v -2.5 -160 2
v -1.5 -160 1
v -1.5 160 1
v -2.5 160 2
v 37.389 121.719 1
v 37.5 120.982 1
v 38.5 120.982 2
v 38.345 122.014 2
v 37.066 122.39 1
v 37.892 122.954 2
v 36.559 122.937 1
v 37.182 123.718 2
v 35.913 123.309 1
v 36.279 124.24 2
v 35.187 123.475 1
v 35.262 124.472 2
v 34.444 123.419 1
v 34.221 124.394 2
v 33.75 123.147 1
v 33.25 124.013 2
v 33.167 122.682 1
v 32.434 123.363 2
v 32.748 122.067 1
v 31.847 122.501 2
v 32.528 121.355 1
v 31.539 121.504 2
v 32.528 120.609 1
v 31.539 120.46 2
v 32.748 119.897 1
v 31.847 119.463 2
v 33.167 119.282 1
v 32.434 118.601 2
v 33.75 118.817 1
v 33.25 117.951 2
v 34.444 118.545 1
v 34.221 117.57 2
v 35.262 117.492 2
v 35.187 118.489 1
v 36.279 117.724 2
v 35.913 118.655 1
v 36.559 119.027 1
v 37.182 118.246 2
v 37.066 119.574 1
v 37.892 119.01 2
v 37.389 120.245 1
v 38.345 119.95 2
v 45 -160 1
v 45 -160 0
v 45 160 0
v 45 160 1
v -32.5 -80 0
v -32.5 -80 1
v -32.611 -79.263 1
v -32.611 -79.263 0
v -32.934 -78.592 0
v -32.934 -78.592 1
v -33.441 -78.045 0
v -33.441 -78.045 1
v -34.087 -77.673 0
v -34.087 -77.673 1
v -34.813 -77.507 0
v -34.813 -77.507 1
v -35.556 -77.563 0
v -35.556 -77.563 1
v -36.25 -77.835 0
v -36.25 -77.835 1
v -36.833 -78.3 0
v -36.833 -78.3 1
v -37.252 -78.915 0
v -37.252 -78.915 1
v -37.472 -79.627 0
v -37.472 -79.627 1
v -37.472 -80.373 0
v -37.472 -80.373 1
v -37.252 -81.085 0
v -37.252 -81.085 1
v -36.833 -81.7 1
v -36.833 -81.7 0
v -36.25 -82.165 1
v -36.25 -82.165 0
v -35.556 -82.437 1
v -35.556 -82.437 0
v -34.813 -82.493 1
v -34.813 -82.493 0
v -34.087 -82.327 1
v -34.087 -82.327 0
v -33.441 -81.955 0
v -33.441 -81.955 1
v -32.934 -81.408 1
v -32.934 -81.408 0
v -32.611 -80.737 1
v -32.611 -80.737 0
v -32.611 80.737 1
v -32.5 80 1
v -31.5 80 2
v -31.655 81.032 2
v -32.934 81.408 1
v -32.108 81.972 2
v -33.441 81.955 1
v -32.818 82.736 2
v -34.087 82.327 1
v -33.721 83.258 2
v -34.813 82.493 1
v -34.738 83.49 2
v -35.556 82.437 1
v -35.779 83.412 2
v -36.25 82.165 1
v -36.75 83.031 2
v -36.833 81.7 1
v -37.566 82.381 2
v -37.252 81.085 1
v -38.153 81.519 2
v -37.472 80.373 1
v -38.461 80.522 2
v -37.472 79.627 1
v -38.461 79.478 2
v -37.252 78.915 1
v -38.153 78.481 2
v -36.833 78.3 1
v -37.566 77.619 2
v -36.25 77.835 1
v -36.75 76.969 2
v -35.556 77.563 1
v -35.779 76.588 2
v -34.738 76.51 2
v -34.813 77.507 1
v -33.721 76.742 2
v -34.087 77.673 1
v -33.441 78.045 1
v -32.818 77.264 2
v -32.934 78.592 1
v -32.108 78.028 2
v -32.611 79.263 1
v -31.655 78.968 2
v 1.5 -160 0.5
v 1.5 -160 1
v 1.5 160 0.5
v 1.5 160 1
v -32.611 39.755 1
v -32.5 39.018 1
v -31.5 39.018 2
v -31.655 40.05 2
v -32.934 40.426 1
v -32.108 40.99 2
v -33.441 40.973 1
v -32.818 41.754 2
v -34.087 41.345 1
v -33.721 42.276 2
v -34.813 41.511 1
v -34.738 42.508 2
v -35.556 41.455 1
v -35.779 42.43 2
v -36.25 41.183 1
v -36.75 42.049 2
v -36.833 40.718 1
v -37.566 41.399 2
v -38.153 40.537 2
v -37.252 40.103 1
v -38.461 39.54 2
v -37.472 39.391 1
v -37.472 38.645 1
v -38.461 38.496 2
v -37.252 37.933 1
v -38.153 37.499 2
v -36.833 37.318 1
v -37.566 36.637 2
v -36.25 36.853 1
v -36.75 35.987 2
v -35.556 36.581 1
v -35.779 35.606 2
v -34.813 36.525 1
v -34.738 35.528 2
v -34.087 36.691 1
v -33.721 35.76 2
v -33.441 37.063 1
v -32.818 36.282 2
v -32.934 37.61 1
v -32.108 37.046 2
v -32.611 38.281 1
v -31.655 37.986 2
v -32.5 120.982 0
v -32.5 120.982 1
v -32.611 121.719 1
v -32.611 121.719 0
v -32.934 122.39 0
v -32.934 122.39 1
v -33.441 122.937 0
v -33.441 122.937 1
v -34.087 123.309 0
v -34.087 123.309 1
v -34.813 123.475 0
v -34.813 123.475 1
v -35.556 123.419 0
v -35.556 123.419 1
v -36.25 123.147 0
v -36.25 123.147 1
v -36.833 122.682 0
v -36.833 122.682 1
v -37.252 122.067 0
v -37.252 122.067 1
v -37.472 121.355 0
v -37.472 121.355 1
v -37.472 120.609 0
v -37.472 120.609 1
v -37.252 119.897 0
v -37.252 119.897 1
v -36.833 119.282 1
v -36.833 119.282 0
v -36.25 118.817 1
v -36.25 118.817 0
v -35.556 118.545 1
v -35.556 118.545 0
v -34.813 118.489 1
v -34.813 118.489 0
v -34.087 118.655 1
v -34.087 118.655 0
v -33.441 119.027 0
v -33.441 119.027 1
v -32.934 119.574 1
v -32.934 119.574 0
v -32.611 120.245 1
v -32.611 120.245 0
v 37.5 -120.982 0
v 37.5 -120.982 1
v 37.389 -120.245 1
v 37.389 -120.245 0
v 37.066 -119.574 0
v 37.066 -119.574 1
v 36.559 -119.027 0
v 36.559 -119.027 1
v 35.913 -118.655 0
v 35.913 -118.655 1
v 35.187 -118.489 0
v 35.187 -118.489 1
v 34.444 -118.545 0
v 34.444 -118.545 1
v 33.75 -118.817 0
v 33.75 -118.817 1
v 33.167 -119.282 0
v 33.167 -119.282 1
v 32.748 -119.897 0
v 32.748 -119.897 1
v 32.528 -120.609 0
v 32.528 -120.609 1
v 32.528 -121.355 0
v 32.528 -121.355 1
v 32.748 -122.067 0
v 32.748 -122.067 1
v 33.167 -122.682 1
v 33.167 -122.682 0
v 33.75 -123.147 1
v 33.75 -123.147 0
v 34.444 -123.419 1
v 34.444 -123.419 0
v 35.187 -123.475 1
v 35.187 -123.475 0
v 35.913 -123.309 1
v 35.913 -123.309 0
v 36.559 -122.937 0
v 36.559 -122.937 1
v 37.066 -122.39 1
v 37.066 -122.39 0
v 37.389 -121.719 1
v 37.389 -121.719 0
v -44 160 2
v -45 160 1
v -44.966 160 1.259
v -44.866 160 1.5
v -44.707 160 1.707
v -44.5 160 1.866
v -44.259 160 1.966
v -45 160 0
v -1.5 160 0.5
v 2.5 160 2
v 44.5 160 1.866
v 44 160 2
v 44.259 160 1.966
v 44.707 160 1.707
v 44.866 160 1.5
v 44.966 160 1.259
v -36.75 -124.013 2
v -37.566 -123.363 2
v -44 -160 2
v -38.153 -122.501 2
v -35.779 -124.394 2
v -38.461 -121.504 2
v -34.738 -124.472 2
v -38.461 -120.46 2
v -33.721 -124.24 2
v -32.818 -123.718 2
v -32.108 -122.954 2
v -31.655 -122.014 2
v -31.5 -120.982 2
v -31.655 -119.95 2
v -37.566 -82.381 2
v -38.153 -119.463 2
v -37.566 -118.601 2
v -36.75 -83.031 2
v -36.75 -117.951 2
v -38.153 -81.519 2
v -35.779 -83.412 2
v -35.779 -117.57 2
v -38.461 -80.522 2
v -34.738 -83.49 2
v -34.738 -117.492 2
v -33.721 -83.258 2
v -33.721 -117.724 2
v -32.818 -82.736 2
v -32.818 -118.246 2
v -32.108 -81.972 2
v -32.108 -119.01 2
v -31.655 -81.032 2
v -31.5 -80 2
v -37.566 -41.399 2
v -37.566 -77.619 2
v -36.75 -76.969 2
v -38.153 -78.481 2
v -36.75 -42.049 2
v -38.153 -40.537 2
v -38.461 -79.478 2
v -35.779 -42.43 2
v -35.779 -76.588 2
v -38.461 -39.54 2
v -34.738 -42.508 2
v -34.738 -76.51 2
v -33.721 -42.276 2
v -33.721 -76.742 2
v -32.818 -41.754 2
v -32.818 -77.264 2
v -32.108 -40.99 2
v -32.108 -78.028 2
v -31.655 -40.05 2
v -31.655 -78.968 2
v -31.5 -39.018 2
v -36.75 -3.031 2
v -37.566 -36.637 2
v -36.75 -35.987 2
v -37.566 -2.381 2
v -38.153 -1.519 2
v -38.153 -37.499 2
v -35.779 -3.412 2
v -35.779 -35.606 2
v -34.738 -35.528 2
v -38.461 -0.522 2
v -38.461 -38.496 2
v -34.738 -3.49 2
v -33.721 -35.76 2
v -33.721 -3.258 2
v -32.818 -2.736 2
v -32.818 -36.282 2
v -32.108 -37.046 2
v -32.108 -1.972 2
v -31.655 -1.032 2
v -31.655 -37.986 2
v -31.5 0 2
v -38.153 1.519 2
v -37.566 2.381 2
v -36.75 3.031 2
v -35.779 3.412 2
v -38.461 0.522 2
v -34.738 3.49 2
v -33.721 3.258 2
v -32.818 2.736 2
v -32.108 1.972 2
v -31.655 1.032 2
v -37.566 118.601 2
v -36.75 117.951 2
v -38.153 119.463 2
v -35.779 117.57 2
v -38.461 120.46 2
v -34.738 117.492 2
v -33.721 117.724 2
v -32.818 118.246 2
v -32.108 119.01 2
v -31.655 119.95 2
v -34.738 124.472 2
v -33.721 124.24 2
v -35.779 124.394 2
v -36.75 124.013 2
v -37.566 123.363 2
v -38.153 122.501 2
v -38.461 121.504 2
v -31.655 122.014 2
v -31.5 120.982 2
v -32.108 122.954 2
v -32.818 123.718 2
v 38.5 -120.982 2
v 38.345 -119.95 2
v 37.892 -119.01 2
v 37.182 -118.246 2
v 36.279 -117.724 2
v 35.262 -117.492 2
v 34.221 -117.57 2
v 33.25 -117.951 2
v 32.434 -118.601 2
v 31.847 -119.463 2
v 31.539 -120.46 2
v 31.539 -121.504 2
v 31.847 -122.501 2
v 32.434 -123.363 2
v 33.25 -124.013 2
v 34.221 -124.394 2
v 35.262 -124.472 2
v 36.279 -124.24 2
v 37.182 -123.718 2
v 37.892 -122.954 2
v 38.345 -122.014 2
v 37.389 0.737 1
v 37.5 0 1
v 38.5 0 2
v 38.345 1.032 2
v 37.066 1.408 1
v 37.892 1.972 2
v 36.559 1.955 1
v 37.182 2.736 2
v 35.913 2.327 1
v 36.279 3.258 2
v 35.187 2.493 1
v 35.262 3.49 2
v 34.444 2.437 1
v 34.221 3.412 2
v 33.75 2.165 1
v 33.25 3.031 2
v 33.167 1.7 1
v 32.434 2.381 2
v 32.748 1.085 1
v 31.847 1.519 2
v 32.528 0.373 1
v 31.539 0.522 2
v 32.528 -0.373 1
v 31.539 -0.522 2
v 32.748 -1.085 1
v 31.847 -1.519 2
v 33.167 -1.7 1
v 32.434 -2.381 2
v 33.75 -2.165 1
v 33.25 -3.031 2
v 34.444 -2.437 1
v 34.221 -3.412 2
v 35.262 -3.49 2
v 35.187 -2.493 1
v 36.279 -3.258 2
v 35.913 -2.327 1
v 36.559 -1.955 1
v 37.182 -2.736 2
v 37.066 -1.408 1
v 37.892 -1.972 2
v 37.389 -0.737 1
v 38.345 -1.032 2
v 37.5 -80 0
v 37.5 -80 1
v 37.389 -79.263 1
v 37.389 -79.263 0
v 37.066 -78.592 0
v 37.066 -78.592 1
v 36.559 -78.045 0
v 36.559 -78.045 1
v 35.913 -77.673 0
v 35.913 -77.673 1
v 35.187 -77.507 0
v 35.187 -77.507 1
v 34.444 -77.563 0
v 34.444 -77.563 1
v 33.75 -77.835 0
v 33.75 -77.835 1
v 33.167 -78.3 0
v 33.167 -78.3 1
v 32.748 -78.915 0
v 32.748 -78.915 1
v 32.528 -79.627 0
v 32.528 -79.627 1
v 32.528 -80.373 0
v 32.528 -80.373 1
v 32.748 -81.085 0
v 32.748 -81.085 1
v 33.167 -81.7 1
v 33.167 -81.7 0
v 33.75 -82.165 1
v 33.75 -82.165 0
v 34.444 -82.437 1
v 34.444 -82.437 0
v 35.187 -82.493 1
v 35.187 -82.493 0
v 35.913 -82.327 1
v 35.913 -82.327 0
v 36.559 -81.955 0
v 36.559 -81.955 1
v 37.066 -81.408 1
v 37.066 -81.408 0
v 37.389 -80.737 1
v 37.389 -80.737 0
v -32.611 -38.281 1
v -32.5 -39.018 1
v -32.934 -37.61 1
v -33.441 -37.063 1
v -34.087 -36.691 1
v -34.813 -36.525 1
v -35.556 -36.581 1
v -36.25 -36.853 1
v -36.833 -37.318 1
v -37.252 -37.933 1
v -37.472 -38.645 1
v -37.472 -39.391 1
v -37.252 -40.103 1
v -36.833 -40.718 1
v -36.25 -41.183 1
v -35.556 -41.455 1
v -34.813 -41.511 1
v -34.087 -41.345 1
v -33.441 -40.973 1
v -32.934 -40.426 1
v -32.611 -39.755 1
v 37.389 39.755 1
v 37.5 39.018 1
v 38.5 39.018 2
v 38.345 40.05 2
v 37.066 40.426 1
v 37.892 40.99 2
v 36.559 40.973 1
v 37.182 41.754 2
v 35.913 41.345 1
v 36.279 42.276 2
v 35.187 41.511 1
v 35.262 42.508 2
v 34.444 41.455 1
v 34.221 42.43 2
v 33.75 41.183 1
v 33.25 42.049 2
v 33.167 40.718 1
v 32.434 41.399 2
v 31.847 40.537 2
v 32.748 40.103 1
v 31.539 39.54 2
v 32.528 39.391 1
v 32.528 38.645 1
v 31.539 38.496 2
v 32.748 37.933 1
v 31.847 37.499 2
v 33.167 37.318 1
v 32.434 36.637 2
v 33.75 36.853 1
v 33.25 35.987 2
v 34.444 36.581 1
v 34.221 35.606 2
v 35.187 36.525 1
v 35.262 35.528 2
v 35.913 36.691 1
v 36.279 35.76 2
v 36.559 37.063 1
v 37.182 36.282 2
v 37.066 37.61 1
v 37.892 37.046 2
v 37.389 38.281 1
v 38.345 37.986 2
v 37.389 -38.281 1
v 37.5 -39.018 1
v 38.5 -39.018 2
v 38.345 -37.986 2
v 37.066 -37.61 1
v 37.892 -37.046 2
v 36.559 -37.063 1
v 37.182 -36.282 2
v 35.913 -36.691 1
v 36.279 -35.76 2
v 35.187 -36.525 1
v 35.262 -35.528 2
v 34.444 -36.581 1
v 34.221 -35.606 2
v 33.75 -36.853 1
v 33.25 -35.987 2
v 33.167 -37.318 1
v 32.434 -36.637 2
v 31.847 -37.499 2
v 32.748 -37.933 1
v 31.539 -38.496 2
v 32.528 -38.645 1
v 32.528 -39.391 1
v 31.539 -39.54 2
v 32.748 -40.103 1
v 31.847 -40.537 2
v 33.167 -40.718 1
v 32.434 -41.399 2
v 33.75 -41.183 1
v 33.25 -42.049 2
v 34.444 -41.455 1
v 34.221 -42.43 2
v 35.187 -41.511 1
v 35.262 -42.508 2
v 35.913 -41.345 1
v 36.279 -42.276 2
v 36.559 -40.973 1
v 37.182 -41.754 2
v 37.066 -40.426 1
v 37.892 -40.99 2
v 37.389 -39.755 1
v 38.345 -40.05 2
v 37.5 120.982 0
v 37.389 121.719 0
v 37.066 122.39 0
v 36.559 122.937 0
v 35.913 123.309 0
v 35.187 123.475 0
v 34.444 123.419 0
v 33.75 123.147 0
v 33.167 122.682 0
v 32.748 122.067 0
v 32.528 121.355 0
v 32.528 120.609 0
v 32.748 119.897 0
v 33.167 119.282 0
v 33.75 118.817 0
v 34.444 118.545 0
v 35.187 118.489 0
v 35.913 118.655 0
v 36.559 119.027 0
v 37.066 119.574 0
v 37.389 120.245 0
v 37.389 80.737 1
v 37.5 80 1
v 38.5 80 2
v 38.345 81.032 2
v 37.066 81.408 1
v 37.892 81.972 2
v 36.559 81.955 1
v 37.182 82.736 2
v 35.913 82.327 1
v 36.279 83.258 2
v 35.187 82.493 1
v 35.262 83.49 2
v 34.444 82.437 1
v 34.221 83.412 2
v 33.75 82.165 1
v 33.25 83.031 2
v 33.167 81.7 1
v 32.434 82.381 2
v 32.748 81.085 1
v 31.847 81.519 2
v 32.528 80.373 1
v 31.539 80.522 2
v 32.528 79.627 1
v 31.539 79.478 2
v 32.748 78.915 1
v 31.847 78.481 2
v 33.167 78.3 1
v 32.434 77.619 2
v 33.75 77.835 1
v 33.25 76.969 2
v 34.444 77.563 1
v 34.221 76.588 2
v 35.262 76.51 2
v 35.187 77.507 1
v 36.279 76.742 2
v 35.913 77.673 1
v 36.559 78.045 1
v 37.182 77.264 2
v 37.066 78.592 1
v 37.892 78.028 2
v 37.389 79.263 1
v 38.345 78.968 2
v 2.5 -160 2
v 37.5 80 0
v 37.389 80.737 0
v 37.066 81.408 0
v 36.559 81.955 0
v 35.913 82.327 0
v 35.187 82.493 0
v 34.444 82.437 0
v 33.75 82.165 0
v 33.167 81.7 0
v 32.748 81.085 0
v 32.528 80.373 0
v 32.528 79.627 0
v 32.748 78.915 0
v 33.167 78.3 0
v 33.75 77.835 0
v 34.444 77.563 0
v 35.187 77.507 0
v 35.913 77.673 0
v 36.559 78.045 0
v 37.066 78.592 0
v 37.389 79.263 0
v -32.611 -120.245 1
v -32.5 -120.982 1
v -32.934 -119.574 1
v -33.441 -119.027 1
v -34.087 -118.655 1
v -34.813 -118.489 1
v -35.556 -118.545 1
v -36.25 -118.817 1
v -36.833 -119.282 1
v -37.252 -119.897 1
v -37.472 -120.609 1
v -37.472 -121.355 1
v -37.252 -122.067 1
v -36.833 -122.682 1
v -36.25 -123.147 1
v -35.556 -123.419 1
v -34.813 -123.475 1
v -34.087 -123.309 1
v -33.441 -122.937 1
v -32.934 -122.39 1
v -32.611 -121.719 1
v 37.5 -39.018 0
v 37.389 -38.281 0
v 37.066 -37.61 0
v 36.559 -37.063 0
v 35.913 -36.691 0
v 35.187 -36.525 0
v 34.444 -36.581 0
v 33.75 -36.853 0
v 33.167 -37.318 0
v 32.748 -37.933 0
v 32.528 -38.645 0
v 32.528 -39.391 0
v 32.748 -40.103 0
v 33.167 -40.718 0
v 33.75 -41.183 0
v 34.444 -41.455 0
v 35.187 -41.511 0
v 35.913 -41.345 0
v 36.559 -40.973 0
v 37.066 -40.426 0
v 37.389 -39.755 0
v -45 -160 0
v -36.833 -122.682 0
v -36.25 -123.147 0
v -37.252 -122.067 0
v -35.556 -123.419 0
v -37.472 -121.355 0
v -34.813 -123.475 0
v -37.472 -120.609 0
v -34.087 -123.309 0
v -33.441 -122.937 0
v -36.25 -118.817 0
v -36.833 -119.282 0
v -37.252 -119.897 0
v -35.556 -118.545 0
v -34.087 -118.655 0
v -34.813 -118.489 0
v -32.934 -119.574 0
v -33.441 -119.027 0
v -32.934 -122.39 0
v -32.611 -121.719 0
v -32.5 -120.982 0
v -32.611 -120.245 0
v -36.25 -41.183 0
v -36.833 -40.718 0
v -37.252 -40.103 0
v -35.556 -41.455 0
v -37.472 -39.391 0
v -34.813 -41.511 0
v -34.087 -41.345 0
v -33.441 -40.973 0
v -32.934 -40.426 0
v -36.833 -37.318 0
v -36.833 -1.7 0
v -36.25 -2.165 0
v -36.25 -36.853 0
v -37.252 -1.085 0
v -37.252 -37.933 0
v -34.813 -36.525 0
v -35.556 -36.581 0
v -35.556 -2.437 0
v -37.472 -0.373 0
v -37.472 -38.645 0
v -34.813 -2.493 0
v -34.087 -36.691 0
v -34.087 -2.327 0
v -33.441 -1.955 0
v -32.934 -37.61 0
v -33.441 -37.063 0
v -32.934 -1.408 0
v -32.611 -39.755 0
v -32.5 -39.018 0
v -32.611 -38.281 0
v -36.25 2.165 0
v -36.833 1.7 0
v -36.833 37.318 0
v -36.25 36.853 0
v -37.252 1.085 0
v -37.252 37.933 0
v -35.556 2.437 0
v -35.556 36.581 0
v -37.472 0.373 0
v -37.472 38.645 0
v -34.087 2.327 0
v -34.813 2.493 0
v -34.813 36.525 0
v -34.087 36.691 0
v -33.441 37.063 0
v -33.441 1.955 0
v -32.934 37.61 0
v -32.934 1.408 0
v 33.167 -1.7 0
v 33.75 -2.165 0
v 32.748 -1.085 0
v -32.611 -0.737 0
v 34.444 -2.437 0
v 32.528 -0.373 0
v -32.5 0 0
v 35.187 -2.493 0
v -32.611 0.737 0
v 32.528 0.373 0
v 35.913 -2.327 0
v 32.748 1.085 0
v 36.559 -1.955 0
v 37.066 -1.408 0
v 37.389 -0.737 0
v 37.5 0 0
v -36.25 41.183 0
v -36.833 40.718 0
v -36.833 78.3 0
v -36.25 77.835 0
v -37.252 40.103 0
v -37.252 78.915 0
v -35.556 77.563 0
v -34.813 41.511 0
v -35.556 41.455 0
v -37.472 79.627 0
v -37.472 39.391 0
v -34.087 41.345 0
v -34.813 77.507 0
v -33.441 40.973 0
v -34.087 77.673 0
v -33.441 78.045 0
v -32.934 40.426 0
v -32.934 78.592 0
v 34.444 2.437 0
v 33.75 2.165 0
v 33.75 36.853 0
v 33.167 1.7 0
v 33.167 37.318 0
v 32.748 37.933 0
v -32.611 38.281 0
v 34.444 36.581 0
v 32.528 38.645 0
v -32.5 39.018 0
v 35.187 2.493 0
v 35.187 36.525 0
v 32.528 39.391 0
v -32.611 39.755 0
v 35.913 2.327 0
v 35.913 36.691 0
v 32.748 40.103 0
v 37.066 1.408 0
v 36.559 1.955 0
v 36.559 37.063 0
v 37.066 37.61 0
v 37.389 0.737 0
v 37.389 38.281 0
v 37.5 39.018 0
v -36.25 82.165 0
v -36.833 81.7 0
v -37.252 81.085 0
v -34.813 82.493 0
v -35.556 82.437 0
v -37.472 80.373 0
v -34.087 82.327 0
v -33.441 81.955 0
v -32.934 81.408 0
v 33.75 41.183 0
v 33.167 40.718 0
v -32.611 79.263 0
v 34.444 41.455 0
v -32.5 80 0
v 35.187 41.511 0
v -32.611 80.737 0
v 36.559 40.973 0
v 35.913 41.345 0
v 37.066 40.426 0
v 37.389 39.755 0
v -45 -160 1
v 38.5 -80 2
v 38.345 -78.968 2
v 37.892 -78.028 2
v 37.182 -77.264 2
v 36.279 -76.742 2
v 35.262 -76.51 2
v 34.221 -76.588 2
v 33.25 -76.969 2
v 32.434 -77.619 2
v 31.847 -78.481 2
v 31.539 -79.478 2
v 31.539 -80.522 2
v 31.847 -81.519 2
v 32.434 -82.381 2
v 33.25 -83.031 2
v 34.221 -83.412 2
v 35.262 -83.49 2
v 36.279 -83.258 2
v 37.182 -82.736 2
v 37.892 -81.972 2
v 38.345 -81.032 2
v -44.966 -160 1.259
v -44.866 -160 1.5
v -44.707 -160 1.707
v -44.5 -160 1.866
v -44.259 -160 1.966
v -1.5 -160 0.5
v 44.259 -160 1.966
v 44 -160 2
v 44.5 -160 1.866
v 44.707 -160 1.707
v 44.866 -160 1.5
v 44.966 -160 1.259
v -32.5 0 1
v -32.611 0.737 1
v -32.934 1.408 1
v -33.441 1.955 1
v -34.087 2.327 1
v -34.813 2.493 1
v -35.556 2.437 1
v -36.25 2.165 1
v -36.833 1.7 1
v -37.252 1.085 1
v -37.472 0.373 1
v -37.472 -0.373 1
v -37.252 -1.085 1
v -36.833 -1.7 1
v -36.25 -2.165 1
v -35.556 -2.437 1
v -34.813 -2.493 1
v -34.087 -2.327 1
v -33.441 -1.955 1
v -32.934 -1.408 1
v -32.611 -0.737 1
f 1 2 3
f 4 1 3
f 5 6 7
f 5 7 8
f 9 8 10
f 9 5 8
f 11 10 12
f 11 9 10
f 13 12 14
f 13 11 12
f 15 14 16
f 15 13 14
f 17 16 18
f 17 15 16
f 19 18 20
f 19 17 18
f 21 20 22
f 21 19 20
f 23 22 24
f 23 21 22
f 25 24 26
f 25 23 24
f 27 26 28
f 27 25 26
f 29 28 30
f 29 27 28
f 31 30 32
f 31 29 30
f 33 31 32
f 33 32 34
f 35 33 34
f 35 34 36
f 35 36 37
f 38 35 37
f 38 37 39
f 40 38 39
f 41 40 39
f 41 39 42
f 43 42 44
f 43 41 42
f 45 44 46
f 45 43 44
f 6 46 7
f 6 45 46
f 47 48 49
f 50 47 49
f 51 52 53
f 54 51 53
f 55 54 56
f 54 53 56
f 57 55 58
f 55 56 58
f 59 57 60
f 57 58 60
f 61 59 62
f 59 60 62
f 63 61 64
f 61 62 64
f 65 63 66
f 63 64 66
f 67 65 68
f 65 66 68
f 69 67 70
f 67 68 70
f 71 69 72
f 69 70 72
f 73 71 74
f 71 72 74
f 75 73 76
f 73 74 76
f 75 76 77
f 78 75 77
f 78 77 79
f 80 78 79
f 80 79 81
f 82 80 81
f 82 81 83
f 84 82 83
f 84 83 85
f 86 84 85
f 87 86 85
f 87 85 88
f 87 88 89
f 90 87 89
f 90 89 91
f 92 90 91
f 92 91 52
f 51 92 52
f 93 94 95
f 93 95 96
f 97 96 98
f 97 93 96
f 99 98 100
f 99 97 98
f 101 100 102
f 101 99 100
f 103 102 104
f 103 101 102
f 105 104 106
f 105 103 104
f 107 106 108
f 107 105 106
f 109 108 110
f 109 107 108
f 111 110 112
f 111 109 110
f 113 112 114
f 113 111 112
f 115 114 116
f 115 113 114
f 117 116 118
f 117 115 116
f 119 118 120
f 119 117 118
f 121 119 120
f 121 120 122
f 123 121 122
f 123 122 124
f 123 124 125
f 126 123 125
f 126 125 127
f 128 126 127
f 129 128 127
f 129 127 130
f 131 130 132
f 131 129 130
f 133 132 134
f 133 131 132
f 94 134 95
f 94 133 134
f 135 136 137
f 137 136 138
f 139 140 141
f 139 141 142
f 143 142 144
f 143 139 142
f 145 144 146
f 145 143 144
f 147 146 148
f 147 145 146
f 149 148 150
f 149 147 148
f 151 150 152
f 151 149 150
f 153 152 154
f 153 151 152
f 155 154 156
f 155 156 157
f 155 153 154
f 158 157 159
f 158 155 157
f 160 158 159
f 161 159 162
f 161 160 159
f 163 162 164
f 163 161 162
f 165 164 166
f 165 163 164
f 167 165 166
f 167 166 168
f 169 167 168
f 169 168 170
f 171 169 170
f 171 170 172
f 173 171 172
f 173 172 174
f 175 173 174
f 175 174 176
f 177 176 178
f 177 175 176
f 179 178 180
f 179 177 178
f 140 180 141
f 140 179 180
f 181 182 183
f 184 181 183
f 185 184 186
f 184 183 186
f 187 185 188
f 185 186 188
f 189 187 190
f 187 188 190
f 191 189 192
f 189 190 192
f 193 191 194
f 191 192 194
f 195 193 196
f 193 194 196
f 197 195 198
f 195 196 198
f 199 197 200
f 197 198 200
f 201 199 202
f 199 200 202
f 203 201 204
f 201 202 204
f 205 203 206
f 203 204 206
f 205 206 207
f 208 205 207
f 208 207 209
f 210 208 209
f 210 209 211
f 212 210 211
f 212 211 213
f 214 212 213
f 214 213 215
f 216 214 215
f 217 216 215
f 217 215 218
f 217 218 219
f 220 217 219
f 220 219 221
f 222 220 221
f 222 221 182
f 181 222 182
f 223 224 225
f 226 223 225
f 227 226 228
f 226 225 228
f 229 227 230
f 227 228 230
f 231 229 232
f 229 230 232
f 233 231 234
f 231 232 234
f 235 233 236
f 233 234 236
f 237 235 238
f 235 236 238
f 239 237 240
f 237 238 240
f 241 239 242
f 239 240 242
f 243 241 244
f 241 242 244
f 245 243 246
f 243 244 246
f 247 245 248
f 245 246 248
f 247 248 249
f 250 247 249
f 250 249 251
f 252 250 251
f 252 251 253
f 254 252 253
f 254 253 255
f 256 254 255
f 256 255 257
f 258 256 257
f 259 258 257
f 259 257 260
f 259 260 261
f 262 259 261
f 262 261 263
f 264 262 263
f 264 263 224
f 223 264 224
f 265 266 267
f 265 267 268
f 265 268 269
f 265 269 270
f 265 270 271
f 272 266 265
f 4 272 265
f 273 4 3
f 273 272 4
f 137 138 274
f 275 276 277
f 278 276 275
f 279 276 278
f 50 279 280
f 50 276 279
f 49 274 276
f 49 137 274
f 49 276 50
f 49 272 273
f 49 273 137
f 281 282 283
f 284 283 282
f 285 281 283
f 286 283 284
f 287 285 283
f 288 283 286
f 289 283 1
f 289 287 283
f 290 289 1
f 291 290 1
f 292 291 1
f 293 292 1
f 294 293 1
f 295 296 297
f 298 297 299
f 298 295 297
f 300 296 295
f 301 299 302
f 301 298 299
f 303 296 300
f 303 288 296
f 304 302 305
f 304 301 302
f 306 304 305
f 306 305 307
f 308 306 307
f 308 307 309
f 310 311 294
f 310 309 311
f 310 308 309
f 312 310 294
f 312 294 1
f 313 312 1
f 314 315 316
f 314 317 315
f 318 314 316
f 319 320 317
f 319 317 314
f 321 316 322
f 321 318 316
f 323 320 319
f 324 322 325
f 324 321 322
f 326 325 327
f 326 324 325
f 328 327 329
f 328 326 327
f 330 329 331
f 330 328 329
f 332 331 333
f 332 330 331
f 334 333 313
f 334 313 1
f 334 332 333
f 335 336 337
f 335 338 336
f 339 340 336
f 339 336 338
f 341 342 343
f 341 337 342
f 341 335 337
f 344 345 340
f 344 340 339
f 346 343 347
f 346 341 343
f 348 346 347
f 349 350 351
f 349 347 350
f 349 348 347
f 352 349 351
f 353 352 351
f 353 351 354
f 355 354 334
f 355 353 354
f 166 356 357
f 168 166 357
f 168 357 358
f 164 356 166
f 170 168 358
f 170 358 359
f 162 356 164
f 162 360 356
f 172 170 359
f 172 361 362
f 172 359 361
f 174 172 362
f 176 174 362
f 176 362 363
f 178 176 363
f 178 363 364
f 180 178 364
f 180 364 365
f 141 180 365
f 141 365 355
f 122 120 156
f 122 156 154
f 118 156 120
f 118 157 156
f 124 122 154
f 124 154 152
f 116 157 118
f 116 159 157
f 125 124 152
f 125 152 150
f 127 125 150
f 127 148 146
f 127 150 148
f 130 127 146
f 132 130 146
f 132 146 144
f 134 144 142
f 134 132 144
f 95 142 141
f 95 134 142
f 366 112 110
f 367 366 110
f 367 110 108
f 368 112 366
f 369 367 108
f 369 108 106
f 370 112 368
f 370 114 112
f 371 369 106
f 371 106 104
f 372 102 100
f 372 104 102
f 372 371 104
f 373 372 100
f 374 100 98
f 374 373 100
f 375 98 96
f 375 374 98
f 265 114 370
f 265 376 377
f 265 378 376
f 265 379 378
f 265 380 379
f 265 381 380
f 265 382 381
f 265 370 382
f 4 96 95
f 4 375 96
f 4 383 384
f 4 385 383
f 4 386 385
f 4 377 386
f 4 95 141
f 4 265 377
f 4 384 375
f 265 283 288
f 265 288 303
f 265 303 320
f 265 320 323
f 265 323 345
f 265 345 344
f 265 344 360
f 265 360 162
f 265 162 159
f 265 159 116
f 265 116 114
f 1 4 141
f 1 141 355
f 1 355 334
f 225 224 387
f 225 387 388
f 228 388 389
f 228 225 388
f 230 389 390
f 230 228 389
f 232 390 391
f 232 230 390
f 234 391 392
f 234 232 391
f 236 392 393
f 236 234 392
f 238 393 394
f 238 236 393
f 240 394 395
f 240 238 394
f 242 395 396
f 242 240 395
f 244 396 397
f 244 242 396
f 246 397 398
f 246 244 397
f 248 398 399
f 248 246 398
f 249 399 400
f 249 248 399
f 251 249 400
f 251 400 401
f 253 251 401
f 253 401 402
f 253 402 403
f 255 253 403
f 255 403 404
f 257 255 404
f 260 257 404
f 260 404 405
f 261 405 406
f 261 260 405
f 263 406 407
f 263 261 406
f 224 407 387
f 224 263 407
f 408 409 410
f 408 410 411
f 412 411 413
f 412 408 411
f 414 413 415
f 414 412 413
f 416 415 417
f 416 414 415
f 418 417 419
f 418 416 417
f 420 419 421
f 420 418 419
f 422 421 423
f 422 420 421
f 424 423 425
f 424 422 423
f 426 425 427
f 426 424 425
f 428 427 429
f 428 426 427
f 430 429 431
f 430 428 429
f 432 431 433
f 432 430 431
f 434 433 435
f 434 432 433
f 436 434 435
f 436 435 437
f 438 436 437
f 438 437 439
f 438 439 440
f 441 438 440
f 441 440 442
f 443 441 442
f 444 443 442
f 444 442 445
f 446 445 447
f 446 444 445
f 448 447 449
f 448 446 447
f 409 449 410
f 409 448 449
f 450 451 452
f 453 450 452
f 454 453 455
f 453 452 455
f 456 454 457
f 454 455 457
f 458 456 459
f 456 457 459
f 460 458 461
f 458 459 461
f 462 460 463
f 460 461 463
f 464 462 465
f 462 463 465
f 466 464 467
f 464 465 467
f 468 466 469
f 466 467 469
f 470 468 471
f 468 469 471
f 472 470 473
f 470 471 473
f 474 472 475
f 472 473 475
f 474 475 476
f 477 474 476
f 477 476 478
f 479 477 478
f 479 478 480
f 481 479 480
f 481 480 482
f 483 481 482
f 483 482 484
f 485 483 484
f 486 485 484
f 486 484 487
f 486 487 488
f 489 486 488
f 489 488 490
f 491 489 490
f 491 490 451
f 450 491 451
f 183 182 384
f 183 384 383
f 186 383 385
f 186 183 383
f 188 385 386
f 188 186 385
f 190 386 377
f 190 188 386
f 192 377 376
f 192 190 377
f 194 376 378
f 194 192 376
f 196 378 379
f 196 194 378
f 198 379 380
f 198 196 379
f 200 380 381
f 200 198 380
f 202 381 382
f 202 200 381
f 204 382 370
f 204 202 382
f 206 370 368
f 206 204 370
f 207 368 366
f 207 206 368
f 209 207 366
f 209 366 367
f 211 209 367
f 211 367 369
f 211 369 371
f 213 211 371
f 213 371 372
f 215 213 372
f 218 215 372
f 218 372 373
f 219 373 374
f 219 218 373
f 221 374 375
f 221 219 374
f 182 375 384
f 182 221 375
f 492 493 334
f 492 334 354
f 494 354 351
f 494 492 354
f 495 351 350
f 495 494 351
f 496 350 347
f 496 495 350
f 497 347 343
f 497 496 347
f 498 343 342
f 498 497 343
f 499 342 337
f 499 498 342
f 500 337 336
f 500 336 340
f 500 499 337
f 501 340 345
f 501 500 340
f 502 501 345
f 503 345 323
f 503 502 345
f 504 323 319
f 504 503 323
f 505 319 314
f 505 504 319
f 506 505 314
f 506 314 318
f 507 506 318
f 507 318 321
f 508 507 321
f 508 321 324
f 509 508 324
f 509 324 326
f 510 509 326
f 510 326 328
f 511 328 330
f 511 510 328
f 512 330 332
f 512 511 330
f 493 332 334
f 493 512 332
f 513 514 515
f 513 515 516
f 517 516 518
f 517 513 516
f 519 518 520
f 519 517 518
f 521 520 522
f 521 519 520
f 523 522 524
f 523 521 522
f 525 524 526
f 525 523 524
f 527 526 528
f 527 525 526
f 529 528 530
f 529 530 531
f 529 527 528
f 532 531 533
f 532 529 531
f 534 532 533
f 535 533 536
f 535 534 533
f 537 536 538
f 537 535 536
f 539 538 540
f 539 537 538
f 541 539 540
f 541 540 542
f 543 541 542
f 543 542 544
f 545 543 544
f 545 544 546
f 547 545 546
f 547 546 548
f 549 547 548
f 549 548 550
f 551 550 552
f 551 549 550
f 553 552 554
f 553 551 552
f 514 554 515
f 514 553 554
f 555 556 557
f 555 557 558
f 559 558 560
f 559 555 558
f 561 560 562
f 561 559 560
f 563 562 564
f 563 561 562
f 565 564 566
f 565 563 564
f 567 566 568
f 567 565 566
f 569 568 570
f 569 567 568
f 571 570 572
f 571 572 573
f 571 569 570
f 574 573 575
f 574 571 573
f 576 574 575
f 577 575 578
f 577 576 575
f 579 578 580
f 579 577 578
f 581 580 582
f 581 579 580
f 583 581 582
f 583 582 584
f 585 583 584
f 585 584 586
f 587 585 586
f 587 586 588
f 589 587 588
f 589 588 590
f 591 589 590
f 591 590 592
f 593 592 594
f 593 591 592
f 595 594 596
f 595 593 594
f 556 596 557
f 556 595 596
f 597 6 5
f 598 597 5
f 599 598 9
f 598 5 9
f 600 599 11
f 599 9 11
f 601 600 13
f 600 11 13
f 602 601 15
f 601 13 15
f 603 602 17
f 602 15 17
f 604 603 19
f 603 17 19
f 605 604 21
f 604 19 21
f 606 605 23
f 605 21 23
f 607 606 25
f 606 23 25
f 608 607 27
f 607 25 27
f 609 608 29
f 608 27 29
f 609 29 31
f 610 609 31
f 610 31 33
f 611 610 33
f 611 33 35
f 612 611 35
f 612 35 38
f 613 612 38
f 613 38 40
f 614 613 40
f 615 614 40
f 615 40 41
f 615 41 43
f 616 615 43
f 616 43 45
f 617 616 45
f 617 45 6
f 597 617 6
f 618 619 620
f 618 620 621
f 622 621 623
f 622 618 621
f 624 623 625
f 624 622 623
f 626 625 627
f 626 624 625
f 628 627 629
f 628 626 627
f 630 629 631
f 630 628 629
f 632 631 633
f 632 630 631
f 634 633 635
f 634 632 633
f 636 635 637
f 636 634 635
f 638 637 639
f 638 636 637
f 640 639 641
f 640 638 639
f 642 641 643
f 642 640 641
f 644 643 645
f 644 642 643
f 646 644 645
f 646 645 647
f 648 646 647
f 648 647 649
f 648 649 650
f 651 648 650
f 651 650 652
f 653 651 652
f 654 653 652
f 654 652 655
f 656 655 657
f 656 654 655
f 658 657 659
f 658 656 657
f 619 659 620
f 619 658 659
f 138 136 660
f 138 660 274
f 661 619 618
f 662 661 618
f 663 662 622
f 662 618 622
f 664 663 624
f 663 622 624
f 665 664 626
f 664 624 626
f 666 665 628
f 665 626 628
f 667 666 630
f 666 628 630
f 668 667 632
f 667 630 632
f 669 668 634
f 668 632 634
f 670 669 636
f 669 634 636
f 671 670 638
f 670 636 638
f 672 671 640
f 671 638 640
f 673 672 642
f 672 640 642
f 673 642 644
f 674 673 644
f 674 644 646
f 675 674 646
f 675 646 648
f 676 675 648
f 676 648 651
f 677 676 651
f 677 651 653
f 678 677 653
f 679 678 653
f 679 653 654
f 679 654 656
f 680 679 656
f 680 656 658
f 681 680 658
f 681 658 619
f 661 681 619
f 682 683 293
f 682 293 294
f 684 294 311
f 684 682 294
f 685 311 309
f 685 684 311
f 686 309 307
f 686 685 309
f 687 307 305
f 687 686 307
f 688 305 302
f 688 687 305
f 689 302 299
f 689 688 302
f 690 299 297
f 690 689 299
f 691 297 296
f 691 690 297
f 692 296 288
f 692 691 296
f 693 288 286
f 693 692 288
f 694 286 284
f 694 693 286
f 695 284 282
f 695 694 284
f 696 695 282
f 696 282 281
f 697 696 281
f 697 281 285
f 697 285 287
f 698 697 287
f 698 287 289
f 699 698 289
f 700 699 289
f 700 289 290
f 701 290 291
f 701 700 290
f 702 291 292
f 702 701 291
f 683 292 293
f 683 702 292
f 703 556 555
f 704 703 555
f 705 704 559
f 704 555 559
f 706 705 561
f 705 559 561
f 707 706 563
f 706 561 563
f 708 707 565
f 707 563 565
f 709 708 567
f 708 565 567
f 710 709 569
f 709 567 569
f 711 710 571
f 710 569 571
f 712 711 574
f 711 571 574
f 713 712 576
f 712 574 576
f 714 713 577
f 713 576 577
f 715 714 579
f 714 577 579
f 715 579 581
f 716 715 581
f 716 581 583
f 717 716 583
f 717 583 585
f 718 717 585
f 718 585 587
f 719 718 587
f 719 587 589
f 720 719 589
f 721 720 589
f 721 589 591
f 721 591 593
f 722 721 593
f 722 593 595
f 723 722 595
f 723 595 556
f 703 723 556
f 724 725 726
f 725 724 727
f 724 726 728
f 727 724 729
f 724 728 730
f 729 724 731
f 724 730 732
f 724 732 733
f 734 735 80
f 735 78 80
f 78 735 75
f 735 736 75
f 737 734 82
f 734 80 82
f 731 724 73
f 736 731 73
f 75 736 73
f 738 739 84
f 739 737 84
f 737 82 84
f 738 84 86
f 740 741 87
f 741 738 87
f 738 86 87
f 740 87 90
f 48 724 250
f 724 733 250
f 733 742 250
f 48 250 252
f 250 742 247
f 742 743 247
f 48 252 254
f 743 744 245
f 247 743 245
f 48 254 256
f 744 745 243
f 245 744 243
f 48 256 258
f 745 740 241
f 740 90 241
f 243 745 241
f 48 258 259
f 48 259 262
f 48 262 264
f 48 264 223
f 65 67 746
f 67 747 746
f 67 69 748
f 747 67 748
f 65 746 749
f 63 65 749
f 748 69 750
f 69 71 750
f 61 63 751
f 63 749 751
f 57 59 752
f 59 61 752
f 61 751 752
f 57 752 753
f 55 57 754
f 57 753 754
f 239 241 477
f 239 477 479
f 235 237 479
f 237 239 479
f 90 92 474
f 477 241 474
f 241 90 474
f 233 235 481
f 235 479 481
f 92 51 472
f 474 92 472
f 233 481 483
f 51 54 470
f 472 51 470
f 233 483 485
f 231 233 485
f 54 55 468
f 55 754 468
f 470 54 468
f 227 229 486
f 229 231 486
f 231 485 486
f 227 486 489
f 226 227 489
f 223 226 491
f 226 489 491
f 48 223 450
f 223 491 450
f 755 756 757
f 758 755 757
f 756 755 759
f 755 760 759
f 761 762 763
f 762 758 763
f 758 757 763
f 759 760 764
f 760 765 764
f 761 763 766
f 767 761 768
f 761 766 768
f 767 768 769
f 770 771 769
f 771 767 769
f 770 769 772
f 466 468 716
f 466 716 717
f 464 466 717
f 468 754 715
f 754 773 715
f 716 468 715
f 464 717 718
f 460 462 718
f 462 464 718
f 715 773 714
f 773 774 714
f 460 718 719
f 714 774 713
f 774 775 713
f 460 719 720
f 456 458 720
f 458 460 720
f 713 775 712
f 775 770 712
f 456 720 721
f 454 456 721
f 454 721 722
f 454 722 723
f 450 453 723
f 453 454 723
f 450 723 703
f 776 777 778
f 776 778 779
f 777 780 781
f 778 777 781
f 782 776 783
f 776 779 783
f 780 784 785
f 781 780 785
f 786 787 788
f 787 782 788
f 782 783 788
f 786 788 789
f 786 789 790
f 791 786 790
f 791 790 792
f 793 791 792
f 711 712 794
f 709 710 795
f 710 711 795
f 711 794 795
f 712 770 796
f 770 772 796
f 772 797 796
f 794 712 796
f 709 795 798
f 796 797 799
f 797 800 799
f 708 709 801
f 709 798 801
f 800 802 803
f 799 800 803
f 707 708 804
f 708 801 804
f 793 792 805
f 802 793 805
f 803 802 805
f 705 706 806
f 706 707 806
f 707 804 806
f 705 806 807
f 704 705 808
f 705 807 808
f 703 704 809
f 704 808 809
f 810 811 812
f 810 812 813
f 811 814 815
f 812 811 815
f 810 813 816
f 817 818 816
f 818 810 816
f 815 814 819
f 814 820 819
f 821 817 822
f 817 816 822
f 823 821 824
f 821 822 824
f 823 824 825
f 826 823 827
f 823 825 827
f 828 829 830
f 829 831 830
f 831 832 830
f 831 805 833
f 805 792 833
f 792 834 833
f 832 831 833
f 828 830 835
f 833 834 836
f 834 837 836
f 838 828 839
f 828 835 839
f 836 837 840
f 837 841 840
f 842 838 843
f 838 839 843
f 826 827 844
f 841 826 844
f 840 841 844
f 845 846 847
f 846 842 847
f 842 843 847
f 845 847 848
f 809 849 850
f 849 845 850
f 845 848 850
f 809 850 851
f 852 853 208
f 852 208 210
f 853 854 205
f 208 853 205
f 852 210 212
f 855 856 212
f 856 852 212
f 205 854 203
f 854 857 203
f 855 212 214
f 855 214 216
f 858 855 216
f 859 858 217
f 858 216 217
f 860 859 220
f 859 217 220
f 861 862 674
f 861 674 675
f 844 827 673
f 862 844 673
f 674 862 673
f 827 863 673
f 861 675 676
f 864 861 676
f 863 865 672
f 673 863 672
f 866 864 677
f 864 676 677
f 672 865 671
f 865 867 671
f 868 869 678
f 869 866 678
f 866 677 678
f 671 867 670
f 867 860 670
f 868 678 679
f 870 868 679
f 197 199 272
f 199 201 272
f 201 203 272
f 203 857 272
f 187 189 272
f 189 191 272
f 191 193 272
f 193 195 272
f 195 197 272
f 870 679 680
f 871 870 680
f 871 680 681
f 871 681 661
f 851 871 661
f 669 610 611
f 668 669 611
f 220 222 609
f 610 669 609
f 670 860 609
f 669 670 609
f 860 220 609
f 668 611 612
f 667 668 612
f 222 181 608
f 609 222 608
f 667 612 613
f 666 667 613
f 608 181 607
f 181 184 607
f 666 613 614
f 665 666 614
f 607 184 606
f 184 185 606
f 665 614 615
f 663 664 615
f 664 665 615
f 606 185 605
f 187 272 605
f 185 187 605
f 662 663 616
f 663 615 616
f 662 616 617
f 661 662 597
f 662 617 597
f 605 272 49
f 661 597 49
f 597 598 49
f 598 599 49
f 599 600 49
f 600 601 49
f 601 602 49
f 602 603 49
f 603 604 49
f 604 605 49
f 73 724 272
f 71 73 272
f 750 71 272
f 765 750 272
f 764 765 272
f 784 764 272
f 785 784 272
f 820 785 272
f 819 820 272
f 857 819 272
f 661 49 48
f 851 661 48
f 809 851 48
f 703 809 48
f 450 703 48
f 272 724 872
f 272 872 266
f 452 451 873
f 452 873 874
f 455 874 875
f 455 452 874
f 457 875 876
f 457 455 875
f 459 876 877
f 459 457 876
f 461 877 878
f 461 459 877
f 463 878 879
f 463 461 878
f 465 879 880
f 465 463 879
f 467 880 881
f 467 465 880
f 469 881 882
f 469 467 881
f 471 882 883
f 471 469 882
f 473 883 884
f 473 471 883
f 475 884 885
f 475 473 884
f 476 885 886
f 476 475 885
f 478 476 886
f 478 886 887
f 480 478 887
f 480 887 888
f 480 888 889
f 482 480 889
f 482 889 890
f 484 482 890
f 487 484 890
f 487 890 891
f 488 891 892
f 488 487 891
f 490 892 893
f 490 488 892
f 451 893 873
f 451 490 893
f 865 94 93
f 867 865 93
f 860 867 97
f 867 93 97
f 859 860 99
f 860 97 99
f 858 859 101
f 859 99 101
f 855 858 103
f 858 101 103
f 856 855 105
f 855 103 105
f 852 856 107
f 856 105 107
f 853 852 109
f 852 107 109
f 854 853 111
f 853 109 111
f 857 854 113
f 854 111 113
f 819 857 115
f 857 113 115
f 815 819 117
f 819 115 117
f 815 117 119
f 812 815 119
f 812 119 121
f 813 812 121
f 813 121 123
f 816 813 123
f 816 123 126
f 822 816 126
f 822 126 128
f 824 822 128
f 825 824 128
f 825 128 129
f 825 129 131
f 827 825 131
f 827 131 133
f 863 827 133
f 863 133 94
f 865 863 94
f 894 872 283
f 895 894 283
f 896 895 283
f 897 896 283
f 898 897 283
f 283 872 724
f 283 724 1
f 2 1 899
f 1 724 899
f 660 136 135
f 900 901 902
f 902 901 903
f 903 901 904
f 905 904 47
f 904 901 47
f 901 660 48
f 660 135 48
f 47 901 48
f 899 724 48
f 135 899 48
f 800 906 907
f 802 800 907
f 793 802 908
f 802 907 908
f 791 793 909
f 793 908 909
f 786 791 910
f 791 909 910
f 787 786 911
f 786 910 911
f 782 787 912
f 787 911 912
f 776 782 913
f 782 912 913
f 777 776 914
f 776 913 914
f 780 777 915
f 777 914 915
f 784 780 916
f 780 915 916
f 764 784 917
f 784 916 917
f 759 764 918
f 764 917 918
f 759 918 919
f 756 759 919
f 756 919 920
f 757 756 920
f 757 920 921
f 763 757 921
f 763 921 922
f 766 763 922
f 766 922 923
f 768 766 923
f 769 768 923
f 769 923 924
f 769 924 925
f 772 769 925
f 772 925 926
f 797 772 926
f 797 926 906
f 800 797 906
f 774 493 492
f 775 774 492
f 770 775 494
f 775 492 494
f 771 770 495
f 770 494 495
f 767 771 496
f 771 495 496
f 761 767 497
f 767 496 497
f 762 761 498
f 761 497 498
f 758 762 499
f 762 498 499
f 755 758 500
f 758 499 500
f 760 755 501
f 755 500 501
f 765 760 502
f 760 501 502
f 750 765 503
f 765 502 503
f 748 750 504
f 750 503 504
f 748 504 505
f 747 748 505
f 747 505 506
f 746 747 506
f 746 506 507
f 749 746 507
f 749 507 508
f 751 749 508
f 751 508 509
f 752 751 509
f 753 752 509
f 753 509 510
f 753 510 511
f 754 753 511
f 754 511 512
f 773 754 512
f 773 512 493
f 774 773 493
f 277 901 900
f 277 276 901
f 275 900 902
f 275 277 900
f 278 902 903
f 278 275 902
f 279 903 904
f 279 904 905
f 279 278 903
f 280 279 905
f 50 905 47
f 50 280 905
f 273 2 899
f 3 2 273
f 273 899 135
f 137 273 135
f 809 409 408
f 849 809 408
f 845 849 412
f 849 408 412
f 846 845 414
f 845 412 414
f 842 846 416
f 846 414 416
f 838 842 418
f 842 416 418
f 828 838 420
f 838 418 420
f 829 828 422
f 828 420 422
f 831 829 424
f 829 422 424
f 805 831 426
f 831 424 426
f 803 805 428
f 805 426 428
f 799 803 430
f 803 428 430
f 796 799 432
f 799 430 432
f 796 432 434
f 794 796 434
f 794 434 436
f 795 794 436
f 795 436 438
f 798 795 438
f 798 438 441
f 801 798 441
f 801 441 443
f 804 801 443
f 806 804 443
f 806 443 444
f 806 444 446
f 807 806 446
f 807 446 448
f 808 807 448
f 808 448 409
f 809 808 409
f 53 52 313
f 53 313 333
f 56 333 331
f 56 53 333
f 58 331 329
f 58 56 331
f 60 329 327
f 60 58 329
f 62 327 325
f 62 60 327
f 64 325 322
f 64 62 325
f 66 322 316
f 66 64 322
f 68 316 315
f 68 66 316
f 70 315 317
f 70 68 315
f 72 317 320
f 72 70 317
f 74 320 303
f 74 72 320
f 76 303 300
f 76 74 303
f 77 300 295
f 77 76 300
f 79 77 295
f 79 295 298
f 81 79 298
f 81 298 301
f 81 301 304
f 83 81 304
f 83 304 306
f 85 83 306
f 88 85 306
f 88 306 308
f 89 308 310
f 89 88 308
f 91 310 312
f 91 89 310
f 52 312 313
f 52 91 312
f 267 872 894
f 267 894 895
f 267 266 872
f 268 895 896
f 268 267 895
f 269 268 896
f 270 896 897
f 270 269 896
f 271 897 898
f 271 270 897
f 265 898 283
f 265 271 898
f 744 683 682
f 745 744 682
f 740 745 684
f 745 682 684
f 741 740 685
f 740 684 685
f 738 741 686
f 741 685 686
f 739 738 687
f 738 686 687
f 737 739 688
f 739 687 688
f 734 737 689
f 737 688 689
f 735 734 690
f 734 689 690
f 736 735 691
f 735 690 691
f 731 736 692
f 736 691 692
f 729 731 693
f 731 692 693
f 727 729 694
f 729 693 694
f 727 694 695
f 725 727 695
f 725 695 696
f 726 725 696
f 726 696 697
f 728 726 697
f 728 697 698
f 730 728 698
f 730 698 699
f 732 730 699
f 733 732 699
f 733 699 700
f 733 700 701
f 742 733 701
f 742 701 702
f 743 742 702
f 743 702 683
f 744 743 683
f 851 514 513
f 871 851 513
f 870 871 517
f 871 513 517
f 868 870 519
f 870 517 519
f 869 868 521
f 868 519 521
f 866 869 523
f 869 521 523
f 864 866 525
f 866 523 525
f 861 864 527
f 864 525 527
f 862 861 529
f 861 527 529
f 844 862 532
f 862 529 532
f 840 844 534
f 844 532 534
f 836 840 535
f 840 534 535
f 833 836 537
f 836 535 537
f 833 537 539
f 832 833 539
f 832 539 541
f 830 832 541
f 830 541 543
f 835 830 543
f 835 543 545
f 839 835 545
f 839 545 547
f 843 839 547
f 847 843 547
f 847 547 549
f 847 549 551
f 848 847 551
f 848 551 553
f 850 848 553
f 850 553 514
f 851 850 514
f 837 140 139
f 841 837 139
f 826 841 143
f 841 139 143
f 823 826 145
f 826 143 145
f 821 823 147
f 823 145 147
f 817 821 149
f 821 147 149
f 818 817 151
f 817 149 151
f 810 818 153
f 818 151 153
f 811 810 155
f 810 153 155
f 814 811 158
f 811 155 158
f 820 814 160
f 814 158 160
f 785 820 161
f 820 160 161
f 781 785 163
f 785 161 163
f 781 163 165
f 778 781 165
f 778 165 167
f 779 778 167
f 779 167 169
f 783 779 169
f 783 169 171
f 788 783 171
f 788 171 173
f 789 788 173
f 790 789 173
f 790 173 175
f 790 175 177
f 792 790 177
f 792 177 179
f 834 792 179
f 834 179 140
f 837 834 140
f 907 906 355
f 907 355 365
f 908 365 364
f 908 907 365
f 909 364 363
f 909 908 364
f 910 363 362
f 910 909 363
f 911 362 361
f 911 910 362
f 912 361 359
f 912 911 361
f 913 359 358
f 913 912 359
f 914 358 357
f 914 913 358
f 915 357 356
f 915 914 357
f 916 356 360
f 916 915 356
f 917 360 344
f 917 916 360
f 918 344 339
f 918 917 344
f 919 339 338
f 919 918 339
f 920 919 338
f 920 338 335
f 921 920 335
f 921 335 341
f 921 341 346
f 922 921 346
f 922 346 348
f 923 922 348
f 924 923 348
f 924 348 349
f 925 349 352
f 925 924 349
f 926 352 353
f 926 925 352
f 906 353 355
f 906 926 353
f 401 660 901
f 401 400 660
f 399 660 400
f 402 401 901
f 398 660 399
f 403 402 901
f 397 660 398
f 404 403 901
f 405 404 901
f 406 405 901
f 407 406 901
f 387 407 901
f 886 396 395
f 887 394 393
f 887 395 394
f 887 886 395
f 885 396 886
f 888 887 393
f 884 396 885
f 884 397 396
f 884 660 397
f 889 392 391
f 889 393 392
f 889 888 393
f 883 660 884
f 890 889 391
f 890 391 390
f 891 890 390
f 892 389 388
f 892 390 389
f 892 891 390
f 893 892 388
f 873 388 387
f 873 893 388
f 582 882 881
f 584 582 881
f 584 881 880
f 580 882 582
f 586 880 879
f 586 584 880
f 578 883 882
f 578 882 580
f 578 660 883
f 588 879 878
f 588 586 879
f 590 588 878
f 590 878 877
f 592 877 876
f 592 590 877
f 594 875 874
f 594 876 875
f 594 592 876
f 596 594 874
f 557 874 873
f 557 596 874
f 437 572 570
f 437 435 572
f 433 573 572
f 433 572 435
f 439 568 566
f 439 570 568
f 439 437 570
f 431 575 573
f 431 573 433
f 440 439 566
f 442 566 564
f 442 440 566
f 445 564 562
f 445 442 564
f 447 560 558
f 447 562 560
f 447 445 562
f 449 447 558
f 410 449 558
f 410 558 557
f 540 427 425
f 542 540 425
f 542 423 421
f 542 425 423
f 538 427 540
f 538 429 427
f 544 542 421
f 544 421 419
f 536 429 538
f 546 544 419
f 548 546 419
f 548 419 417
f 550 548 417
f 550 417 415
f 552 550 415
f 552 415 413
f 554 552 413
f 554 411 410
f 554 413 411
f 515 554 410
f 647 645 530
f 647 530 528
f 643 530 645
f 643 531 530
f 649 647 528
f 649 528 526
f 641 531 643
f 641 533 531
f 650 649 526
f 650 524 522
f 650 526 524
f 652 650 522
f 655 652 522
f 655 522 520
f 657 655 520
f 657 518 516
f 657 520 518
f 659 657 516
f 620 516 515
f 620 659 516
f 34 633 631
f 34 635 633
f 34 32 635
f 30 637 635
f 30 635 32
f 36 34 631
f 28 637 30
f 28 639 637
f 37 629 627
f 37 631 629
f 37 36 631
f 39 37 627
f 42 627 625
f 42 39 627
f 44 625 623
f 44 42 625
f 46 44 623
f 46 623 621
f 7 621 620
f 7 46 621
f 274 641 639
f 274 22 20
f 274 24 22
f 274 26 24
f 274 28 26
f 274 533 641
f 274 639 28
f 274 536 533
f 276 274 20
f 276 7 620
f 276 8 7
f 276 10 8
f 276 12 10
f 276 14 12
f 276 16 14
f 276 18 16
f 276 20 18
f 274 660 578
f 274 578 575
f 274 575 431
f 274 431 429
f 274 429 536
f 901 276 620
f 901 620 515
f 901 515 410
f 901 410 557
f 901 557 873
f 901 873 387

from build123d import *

# Parameters (mm, degrees)
ESQUISSE1_W             = 90
ESQUISSE1_H             = 320
BOSS_EXTRU_1_DEPTH      = 2
ESQUISSE2_R             = 2.5
ENL_V_MAT_EXTRU_1_DEPTH = 45
CONG_2_R                = 1
CHANFREIN1_SIZE         = 1
ENL_V_START             = 2
ESQUISSE3_W             = 3
ESQUISSE3_H             = 320
ENL_V_MAT_EXTRU_2_DEPTH = 1.5
CHANFREIN2_SIZE         = 1


with BuildPart() as part:
    # Esquisse1 → Boss.-Extru.1 (new body)
    with BuildSketch(Plane.XY):
        Rectangle(ESQUISSE1_W, ESQUISSE1_H)
    extrude(amount=BOSS_EXTRU_1_DEPTH)

    # Esquisse2 → Enlèv. mat.-Extru.1 (cut)
    with BuildSketch(Plane.XY.offset(2)):
        with Locations((-35, 120.982014683)):
            Circle(ESQUISSE2_R)
        with Locations((35, 120.982014683)):
            Circle(ESQUISSE2_R)
        with Locations((35, 80)):
            Circle(ESQUISSE2_R)
        with Locations((-35, 80)):
            Circle(ESQUISSE2_R)
        with Locations((-35, 39.017985317)):
            Circle(ESQUISSE2_R)
        with Locations((35, 39.017985317)):
            Circle(ESQUISSE2_R)
        with Locations((35, 0)):
            Circle(ESQUISSE2_R)
        with Locations((-35, 0)):
            Circle(ESQUISSE2_R)
        with Locations((-35, -39.017985317)):
            Circle(ESQUISSE2_R)
        with Locations((35, -39.017985317)):
            Circle(ESQUISSE2_R)
        with Locations((35, -80)):
            Circle(ESQUISSE2_R)
        with Locations((-35, -80)):
            Circle(ESQUISSE2_R)
        with Locations((35, -120.982014683)):
            Circle(ESQUISSE2_R)
        with Locations((-35, -120.982014683)):
            Circle(ESQUISSE2_R)
    extrude(amount=-ENL_V_MAT_EXTRU_1_DEPTH, mode=Mode.SUBTRACT)

    # Congé2
    cong_2_edges = [part.edges().sort_by_distance(p)[0] for p in [
        (45, 0, 2),
        (-45, 0, 2),
    ]]
    fillet(cong_2_edges, radius=CONG_2_R)

    # Chanfrein1
    chanfrein1_edges = [part.edges().sort_by_distance(p)[0] for p in [
        (-37.5, -39.017985317, 2),
        (-37.5, 0, 2),
        (32.5, 0, 2),
        (32.5, 39.017985317, 2),
        (-37.5, 39.017985317, 2),
        (-37.5, 80, 2),
        (32.5, 80, 2),
        (32.5, 120.982014683, 2),
        (-37.5, -120.982014683, 2),
        (32.5, -39.017985317, 2),
        (32.5, -80, 2),
        (-37.5, -80, 2),
        (32.5, -120.982014683, 2),
        (-37.5, 120.982014683, 2),
    ]]
    chamfer(chanfrein1_edges, length=CHANFREIN1_SIZE)

    # Esquisse3 → Enlèv. mat.-Extru.2 (cut)
    with BuildSketch(Plane.XY.offset(ENL_V_START)):
        Rectangle(ESQUISSE3_W, ESQUISSE3_H)
    extrude(amount=-ENL_V_MAT_EXTRU_2_DEPTH, mode=Mode.SUBTRACT)

    # Chanfrein2
    chanfrein2_edges = [part.edges().sort_by_distance(p)[0] for p in [
        (-1.5, 0, 2),
        (1.5, 0, 2),
    ]]
    chamfer(chanfrein2_edges, length=CHANFREIN2_SIZE)


solid = part.part
